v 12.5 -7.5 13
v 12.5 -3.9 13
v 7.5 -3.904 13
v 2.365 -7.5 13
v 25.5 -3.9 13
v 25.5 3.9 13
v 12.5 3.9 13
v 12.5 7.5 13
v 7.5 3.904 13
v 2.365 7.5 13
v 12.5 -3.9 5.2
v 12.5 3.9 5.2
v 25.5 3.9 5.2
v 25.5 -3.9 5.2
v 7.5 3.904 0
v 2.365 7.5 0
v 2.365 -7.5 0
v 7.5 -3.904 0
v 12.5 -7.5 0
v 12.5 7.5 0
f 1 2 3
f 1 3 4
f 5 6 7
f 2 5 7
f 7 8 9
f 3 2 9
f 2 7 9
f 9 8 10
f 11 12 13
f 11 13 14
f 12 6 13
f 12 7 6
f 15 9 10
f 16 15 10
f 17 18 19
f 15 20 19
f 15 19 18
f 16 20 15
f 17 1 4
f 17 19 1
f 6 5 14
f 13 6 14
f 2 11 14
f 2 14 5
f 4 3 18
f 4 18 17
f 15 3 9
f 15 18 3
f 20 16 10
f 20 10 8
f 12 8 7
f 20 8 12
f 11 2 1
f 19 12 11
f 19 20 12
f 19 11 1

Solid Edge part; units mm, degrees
sketch "Sketch1" plane through (0, 0, 0) normal (0, 0, 1) x (1, 0, 0)
  line L0 (12.5, 7.5) -> (12.5, -7.5)
  line L1 (12.5, -7.5) -> (7.5, -7.5)
  line L2 (7.5, -7.5) -> (7.5, 7.5)
  line L3 (7.5, 7.5) -> (12.5, 7.5)
extrude "Protrusion1" add sketch "Sketch1" along normal blind 13
sketch "Sketch2" plane through (12.5, 0, 6.5) normal (1, 0, 0) x (0, 1, 0)
  line L0 (-3.9, -1.3) -> (-3.9, 6.5)
  line L1 (-3.9, 6.5) -> (3.9, 6.5)
  line L2 (3.9, 6.5) -> (3.9, -1.3)
  line L3 (3.9, -1.3) -> (-3.9, -1.3)
extrude "ProtrusiónExtruida_2" add sketch "Sketch2" along normal blind 13
sketch "Sketch3" plane through (0, 0, 0) normal (0, 0, 1) x (1, 0, 0)
  line L0 (7.5, 7.5) -> (2.3647, 7.5)
  line L1 (7.5, 3.9043) -> (2.3647, 7.5)
  line L2 (7.5, 7.5) -> (7.5, 3.9043)
  line L3 (7.5, -3.9043) -> (2.3647, -7.5)
  line L4 (7.5, -7.5) -> (2.3647, -7.5)
  line L5 (7.5, -7.5) -> (7.5, -3.9043)
  dimension "D1" = 15
extrude "Protrusion2" add sketch "Sketch3" along normal up to vertex (13 mm away)
